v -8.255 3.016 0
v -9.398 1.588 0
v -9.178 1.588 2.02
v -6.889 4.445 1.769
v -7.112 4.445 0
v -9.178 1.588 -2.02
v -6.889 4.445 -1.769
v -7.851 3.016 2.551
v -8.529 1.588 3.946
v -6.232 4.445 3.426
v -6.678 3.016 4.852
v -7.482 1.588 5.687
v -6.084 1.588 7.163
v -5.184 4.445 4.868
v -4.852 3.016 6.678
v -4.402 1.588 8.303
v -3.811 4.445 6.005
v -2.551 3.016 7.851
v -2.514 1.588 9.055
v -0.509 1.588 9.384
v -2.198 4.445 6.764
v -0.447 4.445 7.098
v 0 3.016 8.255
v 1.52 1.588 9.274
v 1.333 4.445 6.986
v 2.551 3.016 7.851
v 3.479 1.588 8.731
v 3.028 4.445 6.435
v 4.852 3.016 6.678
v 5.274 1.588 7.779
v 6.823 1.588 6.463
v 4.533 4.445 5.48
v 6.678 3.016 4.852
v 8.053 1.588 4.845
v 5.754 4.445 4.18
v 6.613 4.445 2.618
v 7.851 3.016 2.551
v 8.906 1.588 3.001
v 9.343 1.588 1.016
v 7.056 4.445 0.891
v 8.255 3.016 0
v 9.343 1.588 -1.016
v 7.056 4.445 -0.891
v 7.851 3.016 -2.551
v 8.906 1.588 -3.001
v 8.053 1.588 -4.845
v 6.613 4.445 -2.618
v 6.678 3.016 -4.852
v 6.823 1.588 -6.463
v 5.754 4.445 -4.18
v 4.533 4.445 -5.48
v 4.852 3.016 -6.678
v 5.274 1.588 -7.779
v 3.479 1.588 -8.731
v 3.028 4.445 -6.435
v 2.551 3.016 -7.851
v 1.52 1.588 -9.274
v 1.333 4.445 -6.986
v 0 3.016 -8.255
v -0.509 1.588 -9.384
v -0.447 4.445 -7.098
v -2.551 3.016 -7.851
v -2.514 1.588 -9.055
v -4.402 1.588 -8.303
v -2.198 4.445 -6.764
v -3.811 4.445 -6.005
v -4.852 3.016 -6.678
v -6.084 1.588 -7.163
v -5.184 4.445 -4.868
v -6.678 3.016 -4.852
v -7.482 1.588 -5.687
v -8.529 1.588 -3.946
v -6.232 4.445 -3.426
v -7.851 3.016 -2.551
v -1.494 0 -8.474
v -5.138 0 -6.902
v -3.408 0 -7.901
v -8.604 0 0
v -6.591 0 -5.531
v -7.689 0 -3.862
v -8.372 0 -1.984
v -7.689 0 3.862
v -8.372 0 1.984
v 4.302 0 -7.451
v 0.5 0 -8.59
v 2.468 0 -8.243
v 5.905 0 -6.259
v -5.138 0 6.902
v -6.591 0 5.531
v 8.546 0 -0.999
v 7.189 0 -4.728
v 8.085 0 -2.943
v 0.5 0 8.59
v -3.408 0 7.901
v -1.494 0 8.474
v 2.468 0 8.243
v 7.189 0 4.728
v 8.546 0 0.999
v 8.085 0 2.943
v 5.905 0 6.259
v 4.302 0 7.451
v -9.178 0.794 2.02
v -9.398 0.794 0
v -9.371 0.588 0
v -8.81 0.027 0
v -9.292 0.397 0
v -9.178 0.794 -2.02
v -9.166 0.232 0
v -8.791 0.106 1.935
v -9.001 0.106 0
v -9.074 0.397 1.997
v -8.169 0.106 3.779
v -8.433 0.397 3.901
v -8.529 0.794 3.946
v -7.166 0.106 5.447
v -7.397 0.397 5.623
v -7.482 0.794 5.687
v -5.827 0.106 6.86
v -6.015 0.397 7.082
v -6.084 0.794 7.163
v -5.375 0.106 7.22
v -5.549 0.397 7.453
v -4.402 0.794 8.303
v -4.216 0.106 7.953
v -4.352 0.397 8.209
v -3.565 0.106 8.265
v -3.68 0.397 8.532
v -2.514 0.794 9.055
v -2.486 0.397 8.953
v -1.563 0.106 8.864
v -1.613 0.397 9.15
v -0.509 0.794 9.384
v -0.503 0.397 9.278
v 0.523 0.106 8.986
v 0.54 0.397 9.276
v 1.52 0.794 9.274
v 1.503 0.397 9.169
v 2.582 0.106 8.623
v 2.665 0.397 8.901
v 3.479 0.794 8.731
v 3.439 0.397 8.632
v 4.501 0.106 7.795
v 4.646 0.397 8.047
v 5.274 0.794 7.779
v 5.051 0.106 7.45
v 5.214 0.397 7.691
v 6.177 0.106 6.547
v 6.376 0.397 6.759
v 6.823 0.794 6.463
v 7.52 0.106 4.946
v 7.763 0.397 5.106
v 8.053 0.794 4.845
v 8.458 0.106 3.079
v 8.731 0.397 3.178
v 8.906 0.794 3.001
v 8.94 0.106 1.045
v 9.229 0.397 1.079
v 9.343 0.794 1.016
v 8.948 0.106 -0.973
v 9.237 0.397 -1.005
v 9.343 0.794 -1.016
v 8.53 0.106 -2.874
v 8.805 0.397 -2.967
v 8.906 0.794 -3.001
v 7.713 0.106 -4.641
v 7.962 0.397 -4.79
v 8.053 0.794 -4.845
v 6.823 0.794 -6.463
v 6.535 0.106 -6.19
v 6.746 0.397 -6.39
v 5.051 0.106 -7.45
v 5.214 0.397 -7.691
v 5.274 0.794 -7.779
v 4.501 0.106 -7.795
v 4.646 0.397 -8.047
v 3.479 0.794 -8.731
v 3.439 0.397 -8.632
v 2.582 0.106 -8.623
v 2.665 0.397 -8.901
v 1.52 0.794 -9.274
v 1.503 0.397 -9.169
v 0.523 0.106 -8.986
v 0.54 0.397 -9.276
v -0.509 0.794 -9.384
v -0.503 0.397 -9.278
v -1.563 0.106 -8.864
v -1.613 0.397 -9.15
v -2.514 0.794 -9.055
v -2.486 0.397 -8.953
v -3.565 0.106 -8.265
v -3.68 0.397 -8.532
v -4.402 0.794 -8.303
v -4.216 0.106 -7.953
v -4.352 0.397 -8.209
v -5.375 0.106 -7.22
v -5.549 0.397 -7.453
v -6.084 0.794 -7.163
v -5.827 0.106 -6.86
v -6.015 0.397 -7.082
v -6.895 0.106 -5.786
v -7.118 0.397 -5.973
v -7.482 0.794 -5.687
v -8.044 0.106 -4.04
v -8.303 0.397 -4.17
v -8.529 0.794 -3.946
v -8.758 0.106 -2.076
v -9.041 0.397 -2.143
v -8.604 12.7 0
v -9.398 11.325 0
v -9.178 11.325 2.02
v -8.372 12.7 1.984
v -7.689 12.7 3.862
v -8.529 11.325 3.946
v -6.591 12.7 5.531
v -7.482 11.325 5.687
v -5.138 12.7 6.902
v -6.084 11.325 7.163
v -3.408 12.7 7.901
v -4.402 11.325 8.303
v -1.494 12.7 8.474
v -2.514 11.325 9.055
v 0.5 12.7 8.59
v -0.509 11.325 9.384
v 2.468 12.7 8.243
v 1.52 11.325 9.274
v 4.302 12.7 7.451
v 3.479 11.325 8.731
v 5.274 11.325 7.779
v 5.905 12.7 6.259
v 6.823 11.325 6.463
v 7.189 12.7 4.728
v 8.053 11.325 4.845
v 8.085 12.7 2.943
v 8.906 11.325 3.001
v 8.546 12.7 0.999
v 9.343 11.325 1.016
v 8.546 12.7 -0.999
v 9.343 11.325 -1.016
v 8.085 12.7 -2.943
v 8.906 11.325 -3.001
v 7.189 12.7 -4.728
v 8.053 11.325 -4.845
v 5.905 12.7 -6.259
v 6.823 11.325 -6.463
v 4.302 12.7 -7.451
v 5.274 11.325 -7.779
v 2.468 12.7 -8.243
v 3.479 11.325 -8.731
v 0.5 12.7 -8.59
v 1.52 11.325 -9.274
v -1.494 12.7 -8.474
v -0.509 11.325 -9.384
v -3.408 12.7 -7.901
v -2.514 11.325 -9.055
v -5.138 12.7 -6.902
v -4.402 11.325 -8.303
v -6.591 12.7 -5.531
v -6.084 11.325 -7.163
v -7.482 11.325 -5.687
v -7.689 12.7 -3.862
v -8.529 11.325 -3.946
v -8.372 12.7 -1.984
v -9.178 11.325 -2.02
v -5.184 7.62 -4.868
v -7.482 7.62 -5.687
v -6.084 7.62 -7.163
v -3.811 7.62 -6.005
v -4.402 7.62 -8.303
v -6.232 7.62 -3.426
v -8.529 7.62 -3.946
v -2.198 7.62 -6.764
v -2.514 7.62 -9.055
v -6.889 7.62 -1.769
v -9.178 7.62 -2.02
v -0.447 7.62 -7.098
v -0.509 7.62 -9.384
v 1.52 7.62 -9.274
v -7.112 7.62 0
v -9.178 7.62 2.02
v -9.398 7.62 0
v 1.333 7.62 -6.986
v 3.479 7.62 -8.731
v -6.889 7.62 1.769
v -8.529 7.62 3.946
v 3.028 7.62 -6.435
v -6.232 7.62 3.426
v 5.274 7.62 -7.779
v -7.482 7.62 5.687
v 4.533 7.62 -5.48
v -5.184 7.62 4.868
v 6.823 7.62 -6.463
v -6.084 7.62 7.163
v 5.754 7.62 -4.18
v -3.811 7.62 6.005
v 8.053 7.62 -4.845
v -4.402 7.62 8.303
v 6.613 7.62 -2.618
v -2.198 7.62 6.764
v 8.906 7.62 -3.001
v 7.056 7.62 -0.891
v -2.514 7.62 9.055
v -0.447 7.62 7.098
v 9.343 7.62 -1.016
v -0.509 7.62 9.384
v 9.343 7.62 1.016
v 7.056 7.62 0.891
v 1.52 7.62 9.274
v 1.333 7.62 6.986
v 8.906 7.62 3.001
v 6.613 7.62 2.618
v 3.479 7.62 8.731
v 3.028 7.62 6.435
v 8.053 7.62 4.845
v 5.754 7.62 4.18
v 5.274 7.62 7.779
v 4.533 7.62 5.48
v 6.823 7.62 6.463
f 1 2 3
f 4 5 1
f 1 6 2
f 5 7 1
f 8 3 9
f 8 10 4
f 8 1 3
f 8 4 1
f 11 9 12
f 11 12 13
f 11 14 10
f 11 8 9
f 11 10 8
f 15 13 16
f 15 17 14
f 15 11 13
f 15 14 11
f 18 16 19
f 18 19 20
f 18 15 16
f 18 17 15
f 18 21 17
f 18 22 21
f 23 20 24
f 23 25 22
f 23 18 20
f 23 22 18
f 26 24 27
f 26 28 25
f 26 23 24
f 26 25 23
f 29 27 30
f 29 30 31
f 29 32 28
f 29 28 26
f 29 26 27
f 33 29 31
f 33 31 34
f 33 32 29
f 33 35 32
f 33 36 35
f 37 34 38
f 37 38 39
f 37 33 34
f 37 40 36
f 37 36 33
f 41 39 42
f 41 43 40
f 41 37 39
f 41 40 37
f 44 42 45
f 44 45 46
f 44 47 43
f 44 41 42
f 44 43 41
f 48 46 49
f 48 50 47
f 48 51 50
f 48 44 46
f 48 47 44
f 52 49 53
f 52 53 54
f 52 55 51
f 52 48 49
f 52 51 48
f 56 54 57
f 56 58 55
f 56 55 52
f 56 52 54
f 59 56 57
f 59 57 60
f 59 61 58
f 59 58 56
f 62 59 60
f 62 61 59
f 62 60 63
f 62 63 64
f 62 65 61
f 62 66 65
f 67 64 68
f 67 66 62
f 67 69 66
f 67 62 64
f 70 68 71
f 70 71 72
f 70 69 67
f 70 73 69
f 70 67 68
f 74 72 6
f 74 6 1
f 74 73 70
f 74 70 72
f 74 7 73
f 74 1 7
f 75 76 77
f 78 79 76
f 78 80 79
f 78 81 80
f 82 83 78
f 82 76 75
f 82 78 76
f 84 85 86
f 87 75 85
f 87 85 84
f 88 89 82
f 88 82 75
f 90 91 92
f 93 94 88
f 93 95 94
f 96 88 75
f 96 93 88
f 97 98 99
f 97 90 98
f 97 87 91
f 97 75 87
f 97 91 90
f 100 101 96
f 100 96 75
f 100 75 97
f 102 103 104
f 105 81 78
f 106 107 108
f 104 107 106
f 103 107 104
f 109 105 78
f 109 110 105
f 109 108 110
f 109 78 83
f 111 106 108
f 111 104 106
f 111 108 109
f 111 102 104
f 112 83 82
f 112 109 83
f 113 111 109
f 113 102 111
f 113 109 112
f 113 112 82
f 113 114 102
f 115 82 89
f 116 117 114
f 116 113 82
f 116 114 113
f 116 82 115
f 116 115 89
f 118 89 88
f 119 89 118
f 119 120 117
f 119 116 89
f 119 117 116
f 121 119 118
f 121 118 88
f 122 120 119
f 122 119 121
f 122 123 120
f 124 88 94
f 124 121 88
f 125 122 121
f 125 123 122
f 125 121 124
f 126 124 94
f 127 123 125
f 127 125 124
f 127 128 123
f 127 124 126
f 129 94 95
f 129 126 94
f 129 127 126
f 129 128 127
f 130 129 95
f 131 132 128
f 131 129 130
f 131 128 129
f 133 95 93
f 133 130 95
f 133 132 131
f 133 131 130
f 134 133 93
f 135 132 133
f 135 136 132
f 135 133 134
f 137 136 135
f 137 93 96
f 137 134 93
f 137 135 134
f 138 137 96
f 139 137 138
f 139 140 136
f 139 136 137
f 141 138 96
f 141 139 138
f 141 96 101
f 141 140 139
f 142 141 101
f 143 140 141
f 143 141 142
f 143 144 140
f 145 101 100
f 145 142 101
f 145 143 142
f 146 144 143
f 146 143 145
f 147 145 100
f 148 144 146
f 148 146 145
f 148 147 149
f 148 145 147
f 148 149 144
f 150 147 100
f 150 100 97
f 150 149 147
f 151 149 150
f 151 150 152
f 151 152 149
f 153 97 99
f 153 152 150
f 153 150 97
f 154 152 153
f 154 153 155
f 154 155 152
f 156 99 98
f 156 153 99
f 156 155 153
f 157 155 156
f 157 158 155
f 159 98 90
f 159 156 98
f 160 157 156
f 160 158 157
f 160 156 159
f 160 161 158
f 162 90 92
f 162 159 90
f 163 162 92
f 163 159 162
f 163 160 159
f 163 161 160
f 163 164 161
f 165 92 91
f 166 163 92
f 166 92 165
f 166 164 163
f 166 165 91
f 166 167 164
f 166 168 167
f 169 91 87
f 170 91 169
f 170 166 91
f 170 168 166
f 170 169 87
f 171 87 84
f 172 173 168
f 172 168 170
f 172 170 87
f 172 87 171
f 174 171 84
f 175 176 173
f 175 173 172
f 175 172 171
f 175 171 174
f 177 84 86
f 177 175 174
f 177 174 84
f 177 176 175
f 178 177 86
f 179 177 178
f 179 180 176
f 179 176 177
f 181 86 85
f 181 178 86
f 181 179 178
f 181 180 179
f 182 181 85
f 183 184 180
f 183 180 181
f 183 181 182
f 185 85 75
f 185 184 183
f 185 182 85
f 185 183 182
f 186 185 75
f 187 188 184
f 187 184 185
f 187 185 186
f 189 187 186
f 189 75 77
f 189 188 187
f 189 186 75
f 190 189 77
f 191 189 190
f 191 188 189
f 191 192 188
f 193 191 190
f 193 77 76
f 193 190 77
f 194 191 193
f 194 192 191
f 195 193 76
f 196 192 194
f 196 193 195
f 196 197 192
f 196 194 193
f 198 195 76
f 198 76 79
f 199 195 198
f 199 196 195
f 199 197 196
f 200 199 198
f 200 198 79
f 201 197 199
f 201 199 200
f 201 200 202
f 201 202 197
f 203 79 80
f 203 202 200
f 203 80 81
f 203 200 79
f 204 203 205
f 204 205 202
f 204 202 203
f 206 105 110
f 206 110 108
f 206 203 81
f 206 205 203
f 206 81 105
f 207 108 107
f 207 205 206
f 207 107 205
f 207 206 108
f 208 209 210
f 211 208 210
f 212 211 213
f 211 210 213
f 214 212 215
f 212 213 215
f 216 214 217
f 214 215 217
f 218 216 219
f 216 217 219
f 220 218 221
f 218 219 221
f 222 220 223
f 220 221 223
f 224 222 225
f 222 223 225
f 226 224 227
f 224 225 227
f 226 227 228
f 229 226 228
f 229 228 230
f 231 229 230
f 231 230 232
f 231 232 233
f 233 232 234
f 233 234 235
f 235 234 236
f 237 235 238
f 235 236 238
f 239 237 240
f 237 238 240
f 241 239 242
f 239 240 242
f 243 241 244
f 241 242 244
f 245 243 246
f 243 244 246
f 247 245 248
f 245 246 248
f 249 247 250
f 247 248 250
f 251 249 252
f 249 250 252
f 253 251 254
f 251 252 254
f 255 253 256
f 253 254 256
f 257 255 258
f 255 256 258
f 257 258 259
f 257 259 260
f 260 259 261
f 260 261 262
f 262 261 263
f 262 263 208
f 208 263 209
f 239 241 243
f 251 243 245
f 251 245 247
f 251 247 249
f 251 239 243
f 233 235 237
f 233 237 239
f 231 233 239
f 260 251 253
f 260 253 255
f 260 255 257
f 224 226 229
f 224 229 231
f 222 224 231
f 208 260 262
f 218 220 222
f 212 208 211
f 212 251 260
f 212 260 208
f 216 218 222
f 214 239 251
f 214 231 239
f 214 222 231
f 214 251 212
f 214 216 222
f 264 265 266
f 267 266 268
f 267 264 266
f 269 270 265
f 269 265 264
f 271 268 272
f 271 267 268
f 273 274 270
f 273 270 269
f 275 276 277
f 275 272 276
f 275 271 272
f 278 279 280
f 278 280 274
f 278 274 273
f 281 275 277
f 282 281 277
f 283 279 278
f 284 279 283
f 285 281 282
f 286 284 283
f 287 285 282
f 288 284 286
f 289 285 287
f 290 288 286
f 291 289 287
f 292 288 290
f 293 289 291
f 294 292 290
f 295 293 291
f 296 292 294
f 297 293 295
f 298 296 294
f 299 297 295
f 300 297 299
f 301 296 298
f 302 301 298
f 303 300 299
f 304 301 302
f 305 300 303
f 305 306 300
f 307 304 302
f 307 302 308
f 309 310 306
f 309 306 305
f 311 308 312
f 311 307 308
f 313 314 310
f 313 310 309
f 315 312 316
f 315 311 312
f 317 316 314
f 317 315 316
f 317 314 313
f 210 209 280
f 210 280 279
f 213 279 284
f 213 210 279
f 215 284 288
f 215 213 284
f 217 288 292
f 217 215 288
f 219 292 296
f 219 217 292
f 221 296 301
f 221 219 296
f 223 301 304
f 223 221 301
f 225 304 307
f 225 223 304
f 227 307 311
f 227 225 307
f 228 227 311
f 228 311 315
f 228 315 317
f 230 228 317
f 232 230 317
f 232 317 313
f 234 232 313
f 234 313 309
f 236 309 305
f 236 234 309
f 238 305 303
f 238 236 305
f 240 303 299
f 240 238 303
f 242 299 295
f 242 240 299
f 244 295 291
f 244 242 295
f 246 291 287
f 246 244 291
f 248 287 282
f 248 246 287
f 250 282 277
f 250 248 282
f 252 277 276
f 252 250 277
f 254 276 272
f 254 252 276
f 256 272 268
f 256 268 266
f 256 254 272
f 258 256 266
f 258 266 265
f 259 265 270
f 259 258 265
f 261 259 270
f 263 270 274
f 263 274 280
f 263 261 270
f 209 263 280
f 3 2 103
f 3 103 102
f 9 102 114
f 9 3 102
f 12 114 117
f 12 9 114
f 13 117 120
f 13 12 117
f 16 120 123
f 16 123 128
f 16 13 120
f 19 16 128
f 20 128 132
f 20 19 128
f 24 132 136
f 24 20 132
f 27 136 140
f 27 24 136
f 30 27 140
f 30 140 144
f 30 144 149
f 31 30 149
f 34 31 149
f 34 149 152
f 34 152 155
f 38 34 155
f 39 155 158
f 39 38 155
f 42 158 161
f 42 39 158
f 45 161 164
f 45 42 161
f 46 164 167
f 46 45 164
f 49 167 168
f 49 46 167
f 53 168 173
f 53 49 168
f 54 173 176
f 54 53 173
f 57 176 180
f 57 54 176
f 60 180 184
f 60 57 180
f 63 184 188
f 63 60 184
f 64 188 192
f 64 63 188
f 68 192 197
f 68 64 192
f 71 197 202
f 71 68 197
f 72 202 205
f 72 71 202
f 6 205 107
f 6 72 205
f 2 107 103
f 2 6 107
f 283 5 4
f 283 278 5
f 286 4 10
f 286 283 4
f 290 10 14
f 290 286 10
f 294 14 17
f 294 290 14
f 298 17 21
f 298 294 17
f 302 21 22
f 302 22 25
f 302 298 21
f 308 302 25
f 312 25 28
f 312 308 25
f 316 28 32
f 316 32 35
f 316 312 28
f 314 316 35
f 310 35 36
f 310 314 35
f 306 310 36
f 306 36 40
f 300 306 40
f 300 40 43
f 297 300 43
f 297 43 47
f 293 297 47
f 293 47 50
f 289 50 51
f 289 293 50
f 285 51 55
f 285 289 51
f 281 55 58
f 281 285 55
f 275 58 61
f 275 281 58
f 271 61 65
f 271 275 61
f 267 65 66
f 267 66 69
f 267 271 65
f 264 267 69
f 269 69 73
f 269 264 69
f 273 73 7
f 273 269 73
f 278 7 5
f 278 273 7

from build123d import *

# Parameters (mm, degrees)
FILLET1_R      = 0.79375
CHAMFER1_SIZE  = 0.79375
CHAMFER1_SIZE2 = 1.374815329


with BuildPart() as part:
    # Sketch1 → Revolve1 (revolve)
    with BuildSketch(Plane.XY):
        Polygon((0, 0), (-9.398, 0), (-9.398, 1.5875), (-7.112, 4.445), (-7.112, 7.62), (-9.398, 7.62), (-9.398, 12.7), (0, 12.7), align=None)
    revolve(axis=Axis((0, 0, 0), (0, 1, 0)))

    # Fillet1
    fillet1_edges = [part.edges().sort_by_distance(p)[0] for p in [
        (9.398, 0, 0),
    ]]
    fillet(fillet1_edges, radius=FILLET1_R)

    # Chamfer1
    chamfer1_edges = [part.edges().sort_by_distance(p)[0] for p in [
        (9.398, 12.7, 0),
    ]]
    chamfer1_side = [part.faces().sort_by_distance(p)[0] for p in [
        (0, 12.7, 0),
    ]]
    chamfer(chamfer1_edges, length=CHAMFER1_SIZE, length2=CHAMFER1_SIZE2, reference=chamfer1_side[0])


solid = part.part
